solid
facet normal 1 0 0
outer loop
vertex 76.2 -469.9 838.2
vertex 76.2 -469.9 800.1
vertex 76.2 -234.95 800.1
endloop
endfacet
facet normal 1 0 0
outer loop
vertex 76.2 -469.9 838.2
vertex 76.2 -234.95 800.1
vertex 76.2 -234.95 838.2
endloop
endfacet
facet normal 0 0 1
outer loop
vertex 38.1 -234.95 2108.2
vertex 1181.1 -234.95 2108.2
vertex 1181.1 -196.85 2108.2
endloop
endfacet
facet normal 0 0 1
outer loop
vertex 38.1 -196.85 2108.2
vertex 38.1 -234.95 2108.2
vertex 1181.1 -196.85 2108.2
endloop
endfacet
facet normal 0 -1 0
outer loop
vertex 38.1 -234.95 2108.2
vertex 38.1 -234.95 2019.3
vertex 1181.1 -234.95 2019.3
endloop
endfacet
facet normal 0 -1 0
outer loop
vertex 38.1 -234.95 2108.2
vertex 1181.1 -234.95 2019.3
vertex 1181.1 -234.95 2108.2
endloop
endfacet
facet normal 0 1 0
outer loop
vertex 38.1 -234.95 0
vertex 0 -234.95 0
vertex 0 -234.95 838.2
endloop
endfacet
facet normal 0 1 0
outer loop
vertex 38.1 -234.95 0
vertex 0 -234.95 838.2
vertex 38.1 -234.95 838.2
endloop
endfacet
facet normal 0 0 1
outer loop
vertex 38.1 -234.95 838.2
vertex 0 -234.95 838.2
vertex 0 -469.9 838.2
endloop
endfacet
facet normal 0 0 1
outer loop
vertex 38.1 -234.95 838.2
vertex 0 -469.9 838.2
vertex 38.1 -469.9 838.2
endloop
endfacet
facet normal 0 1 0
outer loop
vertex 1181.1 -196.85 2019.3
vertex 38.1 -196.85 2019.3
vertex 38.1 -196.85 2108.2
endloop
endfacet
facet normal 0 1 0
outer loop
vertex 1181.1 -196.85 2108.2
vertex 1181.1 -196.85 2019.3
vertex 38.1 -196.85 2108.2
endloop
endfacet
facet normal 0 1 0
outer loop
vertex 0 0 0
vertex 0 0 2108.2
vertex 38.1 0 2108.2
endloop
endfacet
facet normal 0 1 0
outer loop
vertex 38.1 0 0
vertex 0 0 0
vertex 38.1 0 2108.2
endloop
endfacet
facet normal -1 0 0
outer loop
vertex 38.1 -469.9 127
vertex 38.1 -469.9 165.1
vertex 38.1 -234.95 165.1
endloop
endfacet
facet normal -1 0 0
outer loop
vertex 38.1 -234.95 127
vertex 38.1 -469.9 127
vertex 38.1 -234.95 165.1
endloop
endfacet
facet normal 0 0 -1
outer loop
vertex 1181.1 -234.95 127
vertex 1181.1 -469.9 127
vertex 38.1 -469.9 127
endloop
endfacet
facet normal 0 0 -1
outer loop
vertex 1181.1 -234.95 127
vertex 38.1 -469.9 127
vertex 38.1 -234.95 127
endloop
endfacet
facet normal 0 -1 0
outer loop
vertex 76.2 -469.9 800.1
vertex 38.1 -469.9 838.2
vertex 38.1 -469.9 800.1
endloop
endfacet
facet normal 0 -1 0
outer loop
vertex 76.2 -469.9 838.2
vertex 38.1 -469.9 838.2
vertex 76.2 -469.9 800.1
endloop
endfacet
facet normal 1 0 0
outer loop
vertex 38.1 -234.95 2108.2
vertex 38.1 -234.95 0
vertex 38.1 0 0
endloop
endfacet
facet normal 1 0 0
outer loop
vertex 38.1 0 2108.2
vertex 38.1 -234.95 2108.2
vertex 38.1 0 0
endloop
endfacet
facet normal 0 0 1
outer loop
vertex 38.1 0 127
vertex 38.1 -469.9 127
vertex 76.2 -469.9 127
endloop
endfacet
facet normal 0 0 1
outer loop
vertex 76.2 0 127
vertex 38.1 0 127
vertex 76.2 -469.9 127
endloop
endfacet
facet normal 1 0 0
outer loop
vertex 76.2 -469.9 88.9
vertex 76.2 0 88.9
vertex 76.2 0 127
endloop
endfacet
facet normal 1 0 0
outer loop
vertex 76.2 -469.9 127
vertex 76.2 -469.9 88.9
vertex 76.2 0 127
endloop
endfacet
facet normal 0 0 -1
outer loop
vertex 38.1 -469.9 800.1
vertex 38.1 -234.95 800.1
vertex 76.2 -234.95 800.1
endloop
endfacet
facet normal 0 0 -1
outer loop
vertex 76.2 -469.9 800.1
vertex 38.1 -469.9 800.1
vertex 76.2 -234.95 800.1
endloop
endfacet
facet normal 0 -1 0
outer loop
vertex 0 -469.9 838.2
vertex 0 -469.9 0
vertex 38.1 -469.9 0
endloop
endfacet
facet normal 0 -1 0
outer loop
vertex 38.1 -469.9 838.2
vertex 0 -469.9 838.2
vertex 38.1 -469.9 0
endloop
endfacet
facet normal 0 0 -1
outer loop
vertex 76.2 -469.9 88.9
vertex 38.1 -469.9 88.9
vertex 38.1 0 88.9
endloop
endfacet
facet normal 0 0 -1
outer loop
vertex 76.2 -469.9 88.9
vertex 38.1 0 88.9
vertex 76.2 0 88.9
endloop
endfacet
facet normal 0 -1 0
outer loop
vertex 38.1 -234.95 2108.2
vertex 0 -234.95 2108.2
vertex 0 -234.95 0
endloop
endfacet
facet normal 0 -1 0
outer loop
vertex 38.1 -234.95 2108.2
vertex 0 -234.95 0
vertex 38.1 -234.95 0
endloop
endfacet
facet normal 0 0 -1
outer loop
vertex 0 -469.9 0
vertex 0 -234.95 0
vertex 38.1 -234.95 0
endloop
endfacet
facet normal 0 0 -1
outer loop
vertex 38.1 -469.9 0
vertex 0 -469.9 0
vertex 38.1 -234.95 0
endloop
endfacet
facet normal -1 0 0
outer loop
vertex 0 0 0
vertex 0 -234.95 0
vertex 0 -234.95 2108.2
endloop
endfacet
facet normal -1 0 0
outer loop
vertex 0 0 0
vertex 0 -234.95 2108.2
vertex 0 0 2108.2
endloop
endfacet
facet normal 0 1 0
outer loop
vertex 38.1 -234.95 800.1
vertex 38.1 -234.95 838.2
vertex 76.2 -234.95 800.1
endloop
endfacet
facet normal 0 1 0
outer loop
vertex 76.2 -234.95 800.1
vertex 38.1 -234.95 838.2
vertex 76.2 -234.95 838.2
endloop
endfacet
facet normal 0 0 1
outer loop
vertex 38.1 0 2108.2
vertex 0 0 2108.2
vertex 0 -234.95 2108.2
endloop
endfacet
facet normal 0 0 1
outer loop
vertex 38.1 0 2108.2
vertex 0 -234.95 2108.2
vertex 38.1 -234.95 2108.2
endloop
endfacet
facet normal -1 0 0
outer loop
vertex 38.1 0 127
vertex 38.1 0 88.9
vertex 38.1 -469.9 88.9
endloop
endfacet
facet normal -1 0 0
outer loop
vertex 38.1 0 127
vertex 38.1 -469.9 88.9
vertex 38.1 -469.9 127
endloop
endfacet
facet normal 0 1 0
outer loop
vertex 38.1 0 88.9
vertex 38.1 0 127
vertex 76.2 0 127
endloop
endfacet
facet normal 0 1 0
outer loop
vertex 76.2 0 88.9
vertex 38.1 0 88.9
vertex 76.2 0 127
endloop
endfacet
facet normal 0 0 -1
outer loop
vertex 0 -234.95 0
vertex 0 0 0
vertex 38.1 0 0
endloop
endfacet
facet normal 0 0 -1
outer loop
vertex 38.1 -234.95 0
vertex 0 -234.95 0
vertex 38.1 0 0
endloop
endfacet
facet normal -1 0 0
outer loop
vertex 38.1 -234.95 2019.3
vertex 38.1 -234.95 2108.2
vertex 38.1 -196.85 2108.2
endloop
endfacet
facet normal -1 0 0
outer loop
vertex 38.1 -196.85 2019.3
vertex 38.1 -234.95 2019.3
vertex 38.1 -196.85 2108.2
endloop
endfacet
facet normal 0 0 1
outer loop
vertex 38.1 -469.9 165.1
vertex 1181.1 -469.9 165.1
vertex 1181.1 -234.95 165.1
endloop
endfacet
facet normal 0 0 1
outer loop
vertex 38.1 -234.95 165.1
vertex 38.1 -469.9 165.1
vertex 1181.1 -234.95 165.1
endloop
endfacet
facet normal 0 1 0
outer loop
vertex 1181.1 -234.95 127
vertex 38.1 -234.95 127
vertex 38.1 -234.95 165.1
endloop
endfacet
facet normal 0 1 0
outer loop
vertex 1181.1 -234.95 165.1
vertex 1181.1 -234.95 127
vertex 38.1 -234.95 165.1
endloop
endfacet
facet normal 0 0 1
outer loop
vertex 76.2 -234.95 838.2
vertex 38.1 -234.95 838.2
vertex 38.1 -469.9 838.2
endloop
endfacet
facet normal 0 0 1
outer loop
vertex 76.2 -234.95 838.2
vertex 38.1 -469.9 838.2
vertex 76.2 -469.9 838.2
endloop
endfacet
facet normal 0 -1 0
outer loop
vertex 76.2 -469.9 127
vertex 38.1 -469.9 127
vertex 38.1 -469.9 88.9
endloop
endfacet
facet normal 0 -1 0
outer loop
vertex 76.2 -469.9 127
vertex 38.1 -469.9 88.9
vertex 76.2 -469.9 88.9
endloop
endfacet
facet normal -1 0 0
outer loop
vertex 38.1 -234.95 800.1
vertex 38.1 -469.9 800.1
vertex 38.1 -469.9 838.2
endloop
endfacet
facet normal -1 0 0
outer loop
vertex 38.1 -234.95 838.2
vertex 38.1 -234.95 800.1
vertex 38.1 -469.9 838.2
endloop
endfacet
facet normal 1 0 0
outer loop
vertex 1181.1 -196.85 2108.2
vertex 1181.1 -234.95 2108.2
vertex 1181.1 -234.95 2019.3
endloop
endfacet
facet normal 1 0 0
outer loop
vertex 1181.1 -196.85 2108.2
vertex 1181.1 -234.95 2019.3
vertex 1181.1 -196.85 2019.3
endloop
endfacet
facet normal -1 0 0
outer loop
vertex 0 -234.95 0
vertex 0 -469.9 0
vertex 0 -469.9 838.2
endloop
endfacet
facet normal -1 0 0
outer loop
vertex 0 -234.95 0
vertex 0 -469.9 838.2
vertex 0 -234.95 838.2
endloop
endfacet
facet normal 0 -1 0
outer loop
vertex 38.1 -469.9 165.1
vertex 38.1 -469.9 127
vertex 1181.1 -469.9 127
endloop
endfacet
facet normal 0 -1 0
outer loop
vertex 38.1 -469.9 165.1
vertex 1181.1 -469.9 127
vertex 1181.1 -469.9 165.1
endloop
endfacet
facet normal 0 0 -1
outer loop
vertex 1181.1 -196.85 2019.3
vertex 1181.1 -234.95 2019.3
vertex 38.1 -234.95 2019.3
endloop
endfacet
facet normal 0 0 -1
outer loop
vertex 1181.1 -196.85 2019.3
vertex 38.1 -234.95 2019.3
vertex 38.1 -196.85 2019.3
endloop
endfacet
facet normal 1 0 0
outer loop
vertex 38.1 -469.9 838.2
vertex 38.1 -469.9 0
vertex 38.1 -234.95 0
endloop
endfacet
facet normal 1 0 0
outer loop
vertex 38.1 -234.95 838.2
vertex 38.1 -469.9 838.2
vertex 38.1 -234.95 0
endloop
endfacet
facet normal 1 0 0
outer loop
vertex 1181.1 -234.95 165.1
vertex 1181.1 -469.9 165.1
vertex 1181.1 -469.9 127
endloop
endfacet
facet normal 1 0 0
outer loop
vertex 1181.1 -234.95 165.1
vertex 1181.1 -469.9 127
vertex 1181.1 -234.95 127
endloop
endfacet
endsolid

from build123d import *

# Parameters (mm, degrees)
F0_W      = 38.1
F0_H      = 234.95
F1_DEPTH  = 2108.2
F2_W      = 38.1
F2_H      = 234.95
F3_DEPTH  = 838.2
F4_W      = 234.95
F4_H      = 38.1
F5_DEPTH  = 1143
F6_W      = 38.1
F6_H      = 88.9
F7_DEPTH  = 1143
F8_W      = 38.1
F8_H      = 38.1
F9_DEPTH  = 469.9
F10_W     = 38.1
F10_H     = 38.1
F11_DEPTH = 234.95


with BuildPart() as f1:
    # F0 (on Top) → F1 (new body)
    with BuildSketch(Plane.XY):
        with Locations((19.05, -117.475)):
            Rectangle(F0_W, F0_H)
    extrude(amount=F1_DEPTH)


with BuildPart() as f3:
    # F2 (on Top) → F3 (new body)
    with BuildSketch(Plane.XY):
        with Locations((19.05, -352.425)):
            Rectangle(F2_W, F2_H)
    extrude(amount=F3_DEPTH)


with BuildPart() as f5:
    # F4 (on face) → F5 (new body)
    with BuildSketch(Plane.YZ.offset(38.1)):
        with Locations((-352.425, 146.05)):
            Rectangle(F4_W, F4_H)
    extrude(amount=F5_DEPTH)


with BuildPart() as f7:
    # F6 (on face) → F7 (new body)
    with BuildSketch(Plane.YZ.offset(38.1)):
        with Locations((-215.9, 2063.75)):
            Rectangle(F6_W, F6_H)
    extrude(amount=F7_DEPTH)


with BuildPart() as f9:
    # F8 (on face) → F9 (new body, through all)
    with BuildSketch(Plane.XZ.offset(469.9)):
        with Locations((57.15, 107.95)):
            Rectangle(F8_W, F8_H)
    extrude(amount=-F9_DEPTH)


with BuildPart() as f11:
    # F10 (on face) → F11 (new body)
    with BuildSketch(Plane.XZ.offset(469.9)):
        with Locations((57.15, 819.15)):
            Rectangle(F10_W, F10_H)
    extrude(amount=-F11_DEPTH)


solid = Compound([f1.part, f3.part, f5.part, f7.part, f9.part, f11.part])
